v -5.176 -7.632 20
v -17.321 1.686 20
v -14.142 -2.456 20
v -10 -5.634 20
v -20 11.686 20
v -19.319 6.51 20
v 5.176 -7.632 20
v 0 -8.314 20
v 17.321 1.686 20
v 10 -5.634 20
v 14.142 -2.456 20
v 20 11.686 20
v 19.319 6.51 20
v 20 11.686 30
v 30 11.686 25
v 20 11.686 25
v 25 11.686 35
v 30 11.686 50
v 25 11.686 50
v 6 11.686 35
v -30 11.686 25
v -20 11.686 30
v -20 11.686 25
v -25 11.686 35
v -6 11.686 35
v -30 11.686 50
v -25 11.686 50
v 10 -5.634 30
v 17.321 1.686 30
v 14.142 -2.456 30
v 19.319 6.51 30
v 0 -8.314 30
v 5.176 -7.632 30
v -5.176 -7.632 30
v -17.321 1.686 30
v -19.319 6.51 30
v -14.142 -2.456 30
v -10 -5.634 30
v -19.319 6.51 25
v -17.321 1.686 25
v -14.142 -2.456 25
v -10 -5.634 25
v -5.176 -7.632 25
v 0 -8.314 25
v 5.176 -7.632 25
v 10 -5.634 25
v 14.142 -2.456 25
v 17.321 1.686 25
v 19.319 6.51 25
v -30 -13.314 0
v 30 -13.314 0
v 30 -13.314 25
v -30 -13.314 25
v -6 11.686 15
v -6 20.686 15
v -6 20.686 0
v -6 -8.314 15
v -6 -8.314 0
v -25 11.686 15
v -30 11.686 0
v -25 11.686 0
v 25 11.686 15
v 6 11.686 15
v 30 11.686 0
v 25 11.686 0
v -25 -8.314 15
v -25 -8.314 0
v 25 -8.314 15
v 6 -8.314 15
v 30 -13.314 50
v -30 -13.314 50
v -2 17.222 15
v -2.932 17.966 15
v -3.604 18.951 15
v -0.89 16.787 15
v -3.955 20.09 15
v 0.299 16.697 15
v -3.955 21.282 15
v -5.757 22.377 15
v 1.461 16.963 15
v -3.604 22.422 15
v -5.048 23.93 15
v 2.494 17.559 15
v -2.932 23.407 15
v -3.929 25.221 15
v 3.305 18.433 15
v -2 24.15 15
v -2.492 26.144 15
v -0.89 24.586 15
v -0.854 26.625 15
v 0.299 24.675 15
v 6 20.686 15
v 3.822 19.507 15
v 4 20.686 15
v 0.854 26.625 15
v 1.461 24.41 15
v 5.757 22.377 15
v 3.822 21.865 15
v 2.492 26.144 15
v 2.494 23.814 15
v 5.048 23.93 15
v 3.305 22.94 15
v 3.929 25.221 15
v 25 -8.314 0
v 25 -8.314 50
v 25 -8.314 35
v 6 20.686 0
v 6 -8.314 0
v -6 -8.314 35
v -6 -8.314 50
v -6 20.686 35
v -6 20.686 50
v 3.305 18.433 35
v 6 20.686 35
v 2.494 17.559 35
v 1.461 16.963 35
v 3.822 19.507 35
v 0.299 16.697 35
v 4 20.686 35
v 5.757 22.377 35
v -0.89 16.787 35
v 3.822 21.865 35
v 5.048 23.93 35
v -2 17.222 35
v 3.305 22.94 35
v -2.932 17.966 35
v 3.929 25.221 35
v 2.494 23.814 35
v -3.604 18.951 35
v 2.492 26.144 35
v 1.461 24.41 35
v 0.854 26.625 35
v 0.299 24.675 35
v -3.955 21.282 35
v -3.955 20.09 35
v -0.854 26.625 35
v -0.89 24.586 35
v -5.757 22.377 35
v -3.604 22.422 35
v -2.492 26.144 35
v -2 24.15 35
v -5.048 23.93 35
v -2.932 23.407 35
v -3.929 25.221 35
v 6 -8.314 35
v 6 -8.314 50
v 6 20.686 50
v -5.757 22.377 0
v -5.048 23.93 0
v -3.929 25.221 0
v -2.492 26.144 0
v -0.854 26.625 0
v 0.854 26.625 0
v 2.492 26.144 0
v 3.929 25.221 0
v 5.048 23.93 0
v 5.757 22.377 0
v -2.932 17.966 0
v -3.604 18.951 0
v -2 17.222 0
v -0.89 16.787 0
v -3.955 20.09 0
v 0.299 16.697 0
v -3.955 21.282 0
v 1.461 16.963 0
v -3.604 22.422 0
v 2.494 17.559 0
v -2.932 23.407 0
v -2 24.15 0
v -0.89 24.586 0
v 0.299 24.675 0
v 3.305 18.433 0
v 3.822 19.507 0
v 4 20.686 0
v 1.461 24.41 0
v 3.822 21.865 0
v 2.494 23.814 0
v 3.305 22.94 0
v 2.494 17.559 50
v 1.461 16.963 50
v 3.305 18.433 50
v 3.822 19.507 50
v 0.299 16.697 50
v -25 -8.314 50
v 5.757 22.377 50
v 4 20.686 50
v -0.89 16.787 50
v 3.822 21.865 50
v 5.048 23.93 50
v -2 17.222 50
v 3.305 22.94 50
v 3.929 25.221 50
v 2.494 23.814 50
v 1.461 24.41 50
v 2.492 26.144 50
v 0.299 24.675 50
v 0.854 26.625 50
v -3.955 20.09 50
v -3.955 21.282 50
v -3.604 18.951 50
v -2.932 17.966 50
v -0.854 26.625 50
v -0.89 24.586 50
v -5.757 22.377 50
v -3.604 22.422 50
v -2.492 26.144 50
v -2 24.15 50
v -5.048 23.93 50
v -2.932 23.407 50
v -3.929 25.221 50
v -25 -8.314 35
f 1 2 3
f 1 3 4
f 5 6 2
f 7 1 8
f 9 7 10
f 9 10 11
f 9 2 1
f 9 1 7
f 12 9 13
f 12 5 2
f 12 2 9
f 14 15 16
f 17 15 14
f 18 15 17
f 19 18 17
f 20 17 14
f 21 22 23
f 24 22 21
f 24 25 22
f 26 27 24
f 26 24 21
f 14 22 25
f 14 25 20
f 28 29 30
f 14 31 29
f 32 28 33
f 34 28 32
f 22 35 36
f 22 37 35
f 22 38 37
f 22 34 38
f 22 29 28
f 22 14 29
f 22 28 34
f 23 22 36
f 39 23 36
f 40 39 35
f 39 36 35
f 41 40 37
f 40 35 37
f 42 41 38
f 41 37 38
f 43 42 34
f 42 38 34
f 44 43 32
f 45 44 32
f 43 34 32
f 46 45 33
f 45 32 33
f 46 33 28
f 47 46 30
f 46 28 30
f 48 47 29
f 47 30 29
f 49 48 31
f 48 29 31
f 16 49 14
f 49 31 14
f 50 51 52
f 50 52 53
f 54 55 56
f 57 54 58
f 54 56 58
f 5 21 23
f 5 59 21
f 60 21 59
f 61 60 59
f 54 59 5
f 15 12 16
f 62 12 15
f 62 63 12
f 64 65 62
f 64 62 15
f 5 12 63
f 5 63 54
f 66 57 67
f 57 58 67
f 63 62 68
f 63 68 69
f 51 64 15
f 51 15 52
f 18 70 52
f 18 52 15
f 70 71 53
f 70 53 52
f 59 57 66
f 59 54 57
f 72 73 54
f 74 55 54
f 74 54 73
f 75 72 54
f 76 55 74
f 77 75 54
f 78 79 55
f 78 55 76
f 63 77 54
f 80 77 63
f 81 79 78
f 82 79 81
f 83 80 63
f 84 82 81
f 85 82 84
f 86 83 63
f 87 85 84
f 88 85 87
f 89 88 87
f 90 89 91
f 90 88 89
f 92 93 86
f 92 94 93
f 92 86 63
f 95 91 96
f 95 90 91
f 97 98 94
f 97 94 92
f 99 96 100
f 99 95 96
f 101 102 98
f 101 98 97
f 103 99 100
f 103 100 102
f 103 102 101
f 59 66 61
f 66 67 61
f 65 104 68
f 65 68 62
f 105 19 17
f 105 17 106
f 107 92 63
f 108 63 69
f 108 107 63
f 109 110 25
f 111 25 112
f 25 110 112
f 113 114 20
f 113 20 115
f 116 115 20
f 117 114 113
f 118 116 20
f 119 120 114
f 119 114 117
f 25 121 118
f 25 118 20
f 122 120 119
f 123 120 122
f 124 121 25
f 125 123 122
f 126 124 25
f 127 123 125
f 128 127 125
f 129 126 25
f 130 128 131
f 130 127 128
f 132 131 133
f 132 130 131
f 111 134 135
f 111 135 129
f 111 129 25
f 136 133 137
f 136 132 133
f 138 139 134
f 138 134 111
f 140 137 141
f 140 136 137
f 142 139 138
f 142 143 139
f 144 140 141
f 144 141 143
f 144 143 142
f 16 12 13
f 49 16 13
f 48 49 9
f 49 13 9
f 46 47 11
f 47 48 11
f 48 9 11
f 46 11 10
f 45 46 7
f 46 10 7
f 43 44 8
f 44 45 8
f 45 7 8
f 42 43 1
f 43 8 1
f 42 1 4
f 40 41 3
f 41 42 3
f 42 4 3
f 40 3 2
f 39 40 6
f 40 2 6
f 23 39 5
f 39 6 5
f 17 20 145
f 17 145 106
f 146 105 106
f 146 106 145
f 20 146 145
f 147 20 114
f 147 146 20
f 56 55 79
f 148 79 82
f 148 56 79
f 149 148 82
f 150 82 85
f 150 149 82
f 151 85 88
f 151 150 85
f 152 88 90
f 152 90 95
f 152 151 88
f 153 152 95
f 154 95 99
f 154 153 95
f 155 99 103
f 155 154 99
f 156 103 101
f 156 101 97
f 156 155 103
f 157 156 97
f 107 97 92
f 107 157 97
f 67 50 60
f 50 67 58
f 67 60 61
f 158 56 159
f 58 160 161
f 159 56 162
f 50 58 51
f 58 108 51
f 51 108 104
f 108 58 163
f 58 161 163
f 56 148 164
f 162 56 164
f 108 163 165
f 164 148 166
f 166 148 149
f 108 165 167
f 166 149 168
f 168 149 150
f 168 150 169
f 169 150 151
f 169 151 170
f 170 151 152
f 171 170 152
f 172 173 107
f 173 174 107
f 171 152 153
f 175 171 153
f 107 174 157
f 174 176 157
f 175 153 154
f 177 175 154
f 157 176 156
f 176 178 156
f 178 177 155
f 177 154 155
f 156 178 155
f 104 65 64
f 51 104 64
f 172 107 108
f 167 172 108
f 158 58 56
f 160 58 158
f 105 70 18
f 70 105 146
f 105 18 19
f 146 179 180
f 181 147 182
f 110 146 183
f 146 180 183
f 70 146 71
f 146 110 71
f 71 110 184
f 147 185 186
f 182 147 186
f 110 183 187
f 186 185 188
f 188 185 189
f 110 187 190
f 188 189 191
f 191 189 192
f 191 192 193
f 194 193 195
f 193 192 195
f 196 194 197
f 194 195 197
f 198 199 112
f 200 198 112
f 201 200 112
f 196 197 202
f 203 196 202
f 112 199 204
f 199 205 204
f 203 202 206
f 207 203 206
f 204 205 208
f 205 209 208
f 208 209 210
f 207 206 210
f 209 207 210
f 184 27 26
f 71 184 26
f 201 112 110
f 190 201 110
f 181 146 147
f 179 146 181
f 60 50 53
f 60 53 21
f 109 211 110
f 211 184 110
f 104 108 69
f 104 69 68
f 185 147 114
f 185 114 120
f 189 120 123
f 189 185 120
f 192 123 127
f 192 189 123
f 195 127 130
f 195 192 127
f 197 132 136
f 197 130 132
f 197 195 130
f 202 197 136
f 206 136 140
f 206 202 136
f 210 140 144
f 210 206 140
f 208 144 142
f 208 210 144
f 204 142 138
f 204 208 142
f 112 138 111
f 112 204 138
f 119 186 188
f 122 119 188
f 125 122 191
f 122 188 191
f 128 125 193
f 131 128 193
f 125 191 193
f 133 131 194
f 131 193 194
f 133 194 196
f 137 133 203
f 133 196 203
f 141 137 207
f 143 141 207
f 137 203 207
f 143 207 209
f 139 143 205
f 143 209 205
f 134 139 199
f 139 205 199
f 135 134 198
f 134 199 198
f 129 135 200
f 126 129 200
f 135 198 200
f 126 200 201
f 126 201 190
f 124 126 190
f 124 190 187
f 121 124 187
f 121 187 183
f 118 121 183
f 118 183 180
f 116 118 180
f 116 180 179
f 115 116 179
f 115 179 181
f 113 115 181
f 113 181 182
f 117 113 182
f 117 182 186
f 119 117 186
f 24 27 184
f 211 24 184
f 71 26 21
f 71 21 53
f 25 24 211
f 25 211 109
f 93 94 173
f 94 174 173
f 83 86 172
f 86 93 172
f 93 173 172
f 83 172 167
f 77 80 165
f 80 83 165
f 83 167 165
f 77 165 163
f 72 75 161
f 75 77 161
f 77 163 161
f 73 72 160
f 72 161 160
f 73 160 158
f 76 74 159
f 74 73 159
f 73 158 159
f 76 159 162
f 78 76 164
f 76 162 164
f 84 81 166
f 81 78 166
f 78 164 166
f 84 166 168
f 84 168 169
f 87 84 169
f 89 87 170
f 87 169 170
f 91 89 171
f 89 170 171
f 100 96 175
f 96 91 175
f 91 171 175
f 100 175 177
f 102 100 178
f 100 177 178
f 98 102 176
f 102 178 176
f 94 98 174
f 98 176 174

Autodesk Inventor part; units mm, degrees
ref_plane "YZ Plane" through (0, 0, 0) normal (1, 0, 0) x (0, 1, 0)
ref_plane "XZ Plane" through (0, 0, 0) normal (0, 1, 0) x (-1, 0, 0)
sketch "Sketch2" plane through (0, 0, 0) normal (0, 0, 1) x (1, 0, 0)
  line L0 (30, -13.3137) -> (-30, -13.3137)
  line L1 (-30, -13.3137) -> (-30, 11.6863)
  line L2 (30, 11.6863) -> (30, -13.3137)
  line L3 (-25, 11.6863) -> (-30, 11.6863)
  line L4 (-6, 11.6863) -> (-6, 20.6863)
  line L5 (6, 20.6863) -> (6, 11.6863)
  arc A0 (6, 20.6863) -> (-6, 20.6863) centre (0, 20.6863) ccw
  circle A1 centre (0, 20.6863) radius 4
  line L6 (-30, 11.6863) -> (-6, 11.6863)
  line L7 (6, 11.6863) -> (30, 11.6863)
  point P0 (0, 0)
  dimension "d0" = 60
  dimension "d9" = 25
  dimension "d12" = 8
  dimension "d13" = 12
  dimension "d14" = 9
extrude "Extrusion1" add sketch "Sketch2" along normal blind 25
sketch "Sketch3" plane through (0, 0, 0) normal (0, 0, -1) x (-1, 0, 0)
  line L0 (-25, 11.6863) -> (-6, 11.6863)
  line L1 (-6, 11.6863) -> (-6, -8.3137)
  line L2 (-6, -8.3137) -> (-25, -8.3137)
  line L3 (-25, -8.3137) -> (-25, 11.6863)
  line L4 (25, 11.6863) -> (6, 11.6863)
  line L5 (6, 11.6863) -> (6, -8.3137)
  line L6 (6, -8.3137) -> (25, -8.3137)
  line L7 (25, -8.3137) -> (25, 11.6863)
  line L8 (30, -13.3137) -> (-30, -13.3137) projected
  line L9 (-30, -13.3137) -> (-30, 11.6863) projected
  line L10 (30, 11.6863) -> (30, -13.3137) projected
  point P0 (0, 0)
  point P1 (-30, -0.8137)
  dimension "d17" = 5
  dimension "d18" = 5
  dimension "d19" = 5
  dimension "d20" = 5
extrude "Extrusion2" cut sketch "Sketch3" against normal blind 15
sketch "Sketch4" plane through (0, 0, 25) normal (0, 0, 1) x (1, 0, 0)
  line L0 (-6, 11.6863) -> (6, 11.6863)
  line L1 (6, 11.6863) -> (6, 20.6863)
  line L2 (6, 26.6863) -> (0, 26.6863)
  line L3 (-6, 20.6863) -> (-6, 11.6863)
  arc A0 (6, 20.6863) -> (-6, 20.6863) centre (0, 20.6863) ccw
  circle A1 centre (0, 20.6863) radius 4
  point P0 (0, 0)
  dimension "d23" = 15
extrude "Extrusion3" cut sketch "Sketch4" against normal blind 10
sketch "Sketch5" plane through (-30, 11.6863, 25) normal (0, 1, 0) x (1, 0, 0)
  line L0 (0, 0) -> (60, 0) projected
  line L1 (30, 0) -> (50, 0)
  line L2 (50, 0) -> (50, 5)
  line L3 (50, 5) -> (30, 5)
  line L4 (30, 5) -> (30, 0)
  point P0 (30, 25)
  dimension "d27" = 20
  dimension "d28" = 5
revolve "Revolution1" cut sketch "Sketch5" angle 360 about axis through (0, 11.6863, 20) along (0, 0, 1)
ref_plane "Work Plane1" through (0, 0, 25) normal (0, 0, 1) x (1, 0, 0)
mirror "Mirror1" about plane through (0, 0, 25) normal (0, 0, 1)
properties part number "khurramf_01_Base"
